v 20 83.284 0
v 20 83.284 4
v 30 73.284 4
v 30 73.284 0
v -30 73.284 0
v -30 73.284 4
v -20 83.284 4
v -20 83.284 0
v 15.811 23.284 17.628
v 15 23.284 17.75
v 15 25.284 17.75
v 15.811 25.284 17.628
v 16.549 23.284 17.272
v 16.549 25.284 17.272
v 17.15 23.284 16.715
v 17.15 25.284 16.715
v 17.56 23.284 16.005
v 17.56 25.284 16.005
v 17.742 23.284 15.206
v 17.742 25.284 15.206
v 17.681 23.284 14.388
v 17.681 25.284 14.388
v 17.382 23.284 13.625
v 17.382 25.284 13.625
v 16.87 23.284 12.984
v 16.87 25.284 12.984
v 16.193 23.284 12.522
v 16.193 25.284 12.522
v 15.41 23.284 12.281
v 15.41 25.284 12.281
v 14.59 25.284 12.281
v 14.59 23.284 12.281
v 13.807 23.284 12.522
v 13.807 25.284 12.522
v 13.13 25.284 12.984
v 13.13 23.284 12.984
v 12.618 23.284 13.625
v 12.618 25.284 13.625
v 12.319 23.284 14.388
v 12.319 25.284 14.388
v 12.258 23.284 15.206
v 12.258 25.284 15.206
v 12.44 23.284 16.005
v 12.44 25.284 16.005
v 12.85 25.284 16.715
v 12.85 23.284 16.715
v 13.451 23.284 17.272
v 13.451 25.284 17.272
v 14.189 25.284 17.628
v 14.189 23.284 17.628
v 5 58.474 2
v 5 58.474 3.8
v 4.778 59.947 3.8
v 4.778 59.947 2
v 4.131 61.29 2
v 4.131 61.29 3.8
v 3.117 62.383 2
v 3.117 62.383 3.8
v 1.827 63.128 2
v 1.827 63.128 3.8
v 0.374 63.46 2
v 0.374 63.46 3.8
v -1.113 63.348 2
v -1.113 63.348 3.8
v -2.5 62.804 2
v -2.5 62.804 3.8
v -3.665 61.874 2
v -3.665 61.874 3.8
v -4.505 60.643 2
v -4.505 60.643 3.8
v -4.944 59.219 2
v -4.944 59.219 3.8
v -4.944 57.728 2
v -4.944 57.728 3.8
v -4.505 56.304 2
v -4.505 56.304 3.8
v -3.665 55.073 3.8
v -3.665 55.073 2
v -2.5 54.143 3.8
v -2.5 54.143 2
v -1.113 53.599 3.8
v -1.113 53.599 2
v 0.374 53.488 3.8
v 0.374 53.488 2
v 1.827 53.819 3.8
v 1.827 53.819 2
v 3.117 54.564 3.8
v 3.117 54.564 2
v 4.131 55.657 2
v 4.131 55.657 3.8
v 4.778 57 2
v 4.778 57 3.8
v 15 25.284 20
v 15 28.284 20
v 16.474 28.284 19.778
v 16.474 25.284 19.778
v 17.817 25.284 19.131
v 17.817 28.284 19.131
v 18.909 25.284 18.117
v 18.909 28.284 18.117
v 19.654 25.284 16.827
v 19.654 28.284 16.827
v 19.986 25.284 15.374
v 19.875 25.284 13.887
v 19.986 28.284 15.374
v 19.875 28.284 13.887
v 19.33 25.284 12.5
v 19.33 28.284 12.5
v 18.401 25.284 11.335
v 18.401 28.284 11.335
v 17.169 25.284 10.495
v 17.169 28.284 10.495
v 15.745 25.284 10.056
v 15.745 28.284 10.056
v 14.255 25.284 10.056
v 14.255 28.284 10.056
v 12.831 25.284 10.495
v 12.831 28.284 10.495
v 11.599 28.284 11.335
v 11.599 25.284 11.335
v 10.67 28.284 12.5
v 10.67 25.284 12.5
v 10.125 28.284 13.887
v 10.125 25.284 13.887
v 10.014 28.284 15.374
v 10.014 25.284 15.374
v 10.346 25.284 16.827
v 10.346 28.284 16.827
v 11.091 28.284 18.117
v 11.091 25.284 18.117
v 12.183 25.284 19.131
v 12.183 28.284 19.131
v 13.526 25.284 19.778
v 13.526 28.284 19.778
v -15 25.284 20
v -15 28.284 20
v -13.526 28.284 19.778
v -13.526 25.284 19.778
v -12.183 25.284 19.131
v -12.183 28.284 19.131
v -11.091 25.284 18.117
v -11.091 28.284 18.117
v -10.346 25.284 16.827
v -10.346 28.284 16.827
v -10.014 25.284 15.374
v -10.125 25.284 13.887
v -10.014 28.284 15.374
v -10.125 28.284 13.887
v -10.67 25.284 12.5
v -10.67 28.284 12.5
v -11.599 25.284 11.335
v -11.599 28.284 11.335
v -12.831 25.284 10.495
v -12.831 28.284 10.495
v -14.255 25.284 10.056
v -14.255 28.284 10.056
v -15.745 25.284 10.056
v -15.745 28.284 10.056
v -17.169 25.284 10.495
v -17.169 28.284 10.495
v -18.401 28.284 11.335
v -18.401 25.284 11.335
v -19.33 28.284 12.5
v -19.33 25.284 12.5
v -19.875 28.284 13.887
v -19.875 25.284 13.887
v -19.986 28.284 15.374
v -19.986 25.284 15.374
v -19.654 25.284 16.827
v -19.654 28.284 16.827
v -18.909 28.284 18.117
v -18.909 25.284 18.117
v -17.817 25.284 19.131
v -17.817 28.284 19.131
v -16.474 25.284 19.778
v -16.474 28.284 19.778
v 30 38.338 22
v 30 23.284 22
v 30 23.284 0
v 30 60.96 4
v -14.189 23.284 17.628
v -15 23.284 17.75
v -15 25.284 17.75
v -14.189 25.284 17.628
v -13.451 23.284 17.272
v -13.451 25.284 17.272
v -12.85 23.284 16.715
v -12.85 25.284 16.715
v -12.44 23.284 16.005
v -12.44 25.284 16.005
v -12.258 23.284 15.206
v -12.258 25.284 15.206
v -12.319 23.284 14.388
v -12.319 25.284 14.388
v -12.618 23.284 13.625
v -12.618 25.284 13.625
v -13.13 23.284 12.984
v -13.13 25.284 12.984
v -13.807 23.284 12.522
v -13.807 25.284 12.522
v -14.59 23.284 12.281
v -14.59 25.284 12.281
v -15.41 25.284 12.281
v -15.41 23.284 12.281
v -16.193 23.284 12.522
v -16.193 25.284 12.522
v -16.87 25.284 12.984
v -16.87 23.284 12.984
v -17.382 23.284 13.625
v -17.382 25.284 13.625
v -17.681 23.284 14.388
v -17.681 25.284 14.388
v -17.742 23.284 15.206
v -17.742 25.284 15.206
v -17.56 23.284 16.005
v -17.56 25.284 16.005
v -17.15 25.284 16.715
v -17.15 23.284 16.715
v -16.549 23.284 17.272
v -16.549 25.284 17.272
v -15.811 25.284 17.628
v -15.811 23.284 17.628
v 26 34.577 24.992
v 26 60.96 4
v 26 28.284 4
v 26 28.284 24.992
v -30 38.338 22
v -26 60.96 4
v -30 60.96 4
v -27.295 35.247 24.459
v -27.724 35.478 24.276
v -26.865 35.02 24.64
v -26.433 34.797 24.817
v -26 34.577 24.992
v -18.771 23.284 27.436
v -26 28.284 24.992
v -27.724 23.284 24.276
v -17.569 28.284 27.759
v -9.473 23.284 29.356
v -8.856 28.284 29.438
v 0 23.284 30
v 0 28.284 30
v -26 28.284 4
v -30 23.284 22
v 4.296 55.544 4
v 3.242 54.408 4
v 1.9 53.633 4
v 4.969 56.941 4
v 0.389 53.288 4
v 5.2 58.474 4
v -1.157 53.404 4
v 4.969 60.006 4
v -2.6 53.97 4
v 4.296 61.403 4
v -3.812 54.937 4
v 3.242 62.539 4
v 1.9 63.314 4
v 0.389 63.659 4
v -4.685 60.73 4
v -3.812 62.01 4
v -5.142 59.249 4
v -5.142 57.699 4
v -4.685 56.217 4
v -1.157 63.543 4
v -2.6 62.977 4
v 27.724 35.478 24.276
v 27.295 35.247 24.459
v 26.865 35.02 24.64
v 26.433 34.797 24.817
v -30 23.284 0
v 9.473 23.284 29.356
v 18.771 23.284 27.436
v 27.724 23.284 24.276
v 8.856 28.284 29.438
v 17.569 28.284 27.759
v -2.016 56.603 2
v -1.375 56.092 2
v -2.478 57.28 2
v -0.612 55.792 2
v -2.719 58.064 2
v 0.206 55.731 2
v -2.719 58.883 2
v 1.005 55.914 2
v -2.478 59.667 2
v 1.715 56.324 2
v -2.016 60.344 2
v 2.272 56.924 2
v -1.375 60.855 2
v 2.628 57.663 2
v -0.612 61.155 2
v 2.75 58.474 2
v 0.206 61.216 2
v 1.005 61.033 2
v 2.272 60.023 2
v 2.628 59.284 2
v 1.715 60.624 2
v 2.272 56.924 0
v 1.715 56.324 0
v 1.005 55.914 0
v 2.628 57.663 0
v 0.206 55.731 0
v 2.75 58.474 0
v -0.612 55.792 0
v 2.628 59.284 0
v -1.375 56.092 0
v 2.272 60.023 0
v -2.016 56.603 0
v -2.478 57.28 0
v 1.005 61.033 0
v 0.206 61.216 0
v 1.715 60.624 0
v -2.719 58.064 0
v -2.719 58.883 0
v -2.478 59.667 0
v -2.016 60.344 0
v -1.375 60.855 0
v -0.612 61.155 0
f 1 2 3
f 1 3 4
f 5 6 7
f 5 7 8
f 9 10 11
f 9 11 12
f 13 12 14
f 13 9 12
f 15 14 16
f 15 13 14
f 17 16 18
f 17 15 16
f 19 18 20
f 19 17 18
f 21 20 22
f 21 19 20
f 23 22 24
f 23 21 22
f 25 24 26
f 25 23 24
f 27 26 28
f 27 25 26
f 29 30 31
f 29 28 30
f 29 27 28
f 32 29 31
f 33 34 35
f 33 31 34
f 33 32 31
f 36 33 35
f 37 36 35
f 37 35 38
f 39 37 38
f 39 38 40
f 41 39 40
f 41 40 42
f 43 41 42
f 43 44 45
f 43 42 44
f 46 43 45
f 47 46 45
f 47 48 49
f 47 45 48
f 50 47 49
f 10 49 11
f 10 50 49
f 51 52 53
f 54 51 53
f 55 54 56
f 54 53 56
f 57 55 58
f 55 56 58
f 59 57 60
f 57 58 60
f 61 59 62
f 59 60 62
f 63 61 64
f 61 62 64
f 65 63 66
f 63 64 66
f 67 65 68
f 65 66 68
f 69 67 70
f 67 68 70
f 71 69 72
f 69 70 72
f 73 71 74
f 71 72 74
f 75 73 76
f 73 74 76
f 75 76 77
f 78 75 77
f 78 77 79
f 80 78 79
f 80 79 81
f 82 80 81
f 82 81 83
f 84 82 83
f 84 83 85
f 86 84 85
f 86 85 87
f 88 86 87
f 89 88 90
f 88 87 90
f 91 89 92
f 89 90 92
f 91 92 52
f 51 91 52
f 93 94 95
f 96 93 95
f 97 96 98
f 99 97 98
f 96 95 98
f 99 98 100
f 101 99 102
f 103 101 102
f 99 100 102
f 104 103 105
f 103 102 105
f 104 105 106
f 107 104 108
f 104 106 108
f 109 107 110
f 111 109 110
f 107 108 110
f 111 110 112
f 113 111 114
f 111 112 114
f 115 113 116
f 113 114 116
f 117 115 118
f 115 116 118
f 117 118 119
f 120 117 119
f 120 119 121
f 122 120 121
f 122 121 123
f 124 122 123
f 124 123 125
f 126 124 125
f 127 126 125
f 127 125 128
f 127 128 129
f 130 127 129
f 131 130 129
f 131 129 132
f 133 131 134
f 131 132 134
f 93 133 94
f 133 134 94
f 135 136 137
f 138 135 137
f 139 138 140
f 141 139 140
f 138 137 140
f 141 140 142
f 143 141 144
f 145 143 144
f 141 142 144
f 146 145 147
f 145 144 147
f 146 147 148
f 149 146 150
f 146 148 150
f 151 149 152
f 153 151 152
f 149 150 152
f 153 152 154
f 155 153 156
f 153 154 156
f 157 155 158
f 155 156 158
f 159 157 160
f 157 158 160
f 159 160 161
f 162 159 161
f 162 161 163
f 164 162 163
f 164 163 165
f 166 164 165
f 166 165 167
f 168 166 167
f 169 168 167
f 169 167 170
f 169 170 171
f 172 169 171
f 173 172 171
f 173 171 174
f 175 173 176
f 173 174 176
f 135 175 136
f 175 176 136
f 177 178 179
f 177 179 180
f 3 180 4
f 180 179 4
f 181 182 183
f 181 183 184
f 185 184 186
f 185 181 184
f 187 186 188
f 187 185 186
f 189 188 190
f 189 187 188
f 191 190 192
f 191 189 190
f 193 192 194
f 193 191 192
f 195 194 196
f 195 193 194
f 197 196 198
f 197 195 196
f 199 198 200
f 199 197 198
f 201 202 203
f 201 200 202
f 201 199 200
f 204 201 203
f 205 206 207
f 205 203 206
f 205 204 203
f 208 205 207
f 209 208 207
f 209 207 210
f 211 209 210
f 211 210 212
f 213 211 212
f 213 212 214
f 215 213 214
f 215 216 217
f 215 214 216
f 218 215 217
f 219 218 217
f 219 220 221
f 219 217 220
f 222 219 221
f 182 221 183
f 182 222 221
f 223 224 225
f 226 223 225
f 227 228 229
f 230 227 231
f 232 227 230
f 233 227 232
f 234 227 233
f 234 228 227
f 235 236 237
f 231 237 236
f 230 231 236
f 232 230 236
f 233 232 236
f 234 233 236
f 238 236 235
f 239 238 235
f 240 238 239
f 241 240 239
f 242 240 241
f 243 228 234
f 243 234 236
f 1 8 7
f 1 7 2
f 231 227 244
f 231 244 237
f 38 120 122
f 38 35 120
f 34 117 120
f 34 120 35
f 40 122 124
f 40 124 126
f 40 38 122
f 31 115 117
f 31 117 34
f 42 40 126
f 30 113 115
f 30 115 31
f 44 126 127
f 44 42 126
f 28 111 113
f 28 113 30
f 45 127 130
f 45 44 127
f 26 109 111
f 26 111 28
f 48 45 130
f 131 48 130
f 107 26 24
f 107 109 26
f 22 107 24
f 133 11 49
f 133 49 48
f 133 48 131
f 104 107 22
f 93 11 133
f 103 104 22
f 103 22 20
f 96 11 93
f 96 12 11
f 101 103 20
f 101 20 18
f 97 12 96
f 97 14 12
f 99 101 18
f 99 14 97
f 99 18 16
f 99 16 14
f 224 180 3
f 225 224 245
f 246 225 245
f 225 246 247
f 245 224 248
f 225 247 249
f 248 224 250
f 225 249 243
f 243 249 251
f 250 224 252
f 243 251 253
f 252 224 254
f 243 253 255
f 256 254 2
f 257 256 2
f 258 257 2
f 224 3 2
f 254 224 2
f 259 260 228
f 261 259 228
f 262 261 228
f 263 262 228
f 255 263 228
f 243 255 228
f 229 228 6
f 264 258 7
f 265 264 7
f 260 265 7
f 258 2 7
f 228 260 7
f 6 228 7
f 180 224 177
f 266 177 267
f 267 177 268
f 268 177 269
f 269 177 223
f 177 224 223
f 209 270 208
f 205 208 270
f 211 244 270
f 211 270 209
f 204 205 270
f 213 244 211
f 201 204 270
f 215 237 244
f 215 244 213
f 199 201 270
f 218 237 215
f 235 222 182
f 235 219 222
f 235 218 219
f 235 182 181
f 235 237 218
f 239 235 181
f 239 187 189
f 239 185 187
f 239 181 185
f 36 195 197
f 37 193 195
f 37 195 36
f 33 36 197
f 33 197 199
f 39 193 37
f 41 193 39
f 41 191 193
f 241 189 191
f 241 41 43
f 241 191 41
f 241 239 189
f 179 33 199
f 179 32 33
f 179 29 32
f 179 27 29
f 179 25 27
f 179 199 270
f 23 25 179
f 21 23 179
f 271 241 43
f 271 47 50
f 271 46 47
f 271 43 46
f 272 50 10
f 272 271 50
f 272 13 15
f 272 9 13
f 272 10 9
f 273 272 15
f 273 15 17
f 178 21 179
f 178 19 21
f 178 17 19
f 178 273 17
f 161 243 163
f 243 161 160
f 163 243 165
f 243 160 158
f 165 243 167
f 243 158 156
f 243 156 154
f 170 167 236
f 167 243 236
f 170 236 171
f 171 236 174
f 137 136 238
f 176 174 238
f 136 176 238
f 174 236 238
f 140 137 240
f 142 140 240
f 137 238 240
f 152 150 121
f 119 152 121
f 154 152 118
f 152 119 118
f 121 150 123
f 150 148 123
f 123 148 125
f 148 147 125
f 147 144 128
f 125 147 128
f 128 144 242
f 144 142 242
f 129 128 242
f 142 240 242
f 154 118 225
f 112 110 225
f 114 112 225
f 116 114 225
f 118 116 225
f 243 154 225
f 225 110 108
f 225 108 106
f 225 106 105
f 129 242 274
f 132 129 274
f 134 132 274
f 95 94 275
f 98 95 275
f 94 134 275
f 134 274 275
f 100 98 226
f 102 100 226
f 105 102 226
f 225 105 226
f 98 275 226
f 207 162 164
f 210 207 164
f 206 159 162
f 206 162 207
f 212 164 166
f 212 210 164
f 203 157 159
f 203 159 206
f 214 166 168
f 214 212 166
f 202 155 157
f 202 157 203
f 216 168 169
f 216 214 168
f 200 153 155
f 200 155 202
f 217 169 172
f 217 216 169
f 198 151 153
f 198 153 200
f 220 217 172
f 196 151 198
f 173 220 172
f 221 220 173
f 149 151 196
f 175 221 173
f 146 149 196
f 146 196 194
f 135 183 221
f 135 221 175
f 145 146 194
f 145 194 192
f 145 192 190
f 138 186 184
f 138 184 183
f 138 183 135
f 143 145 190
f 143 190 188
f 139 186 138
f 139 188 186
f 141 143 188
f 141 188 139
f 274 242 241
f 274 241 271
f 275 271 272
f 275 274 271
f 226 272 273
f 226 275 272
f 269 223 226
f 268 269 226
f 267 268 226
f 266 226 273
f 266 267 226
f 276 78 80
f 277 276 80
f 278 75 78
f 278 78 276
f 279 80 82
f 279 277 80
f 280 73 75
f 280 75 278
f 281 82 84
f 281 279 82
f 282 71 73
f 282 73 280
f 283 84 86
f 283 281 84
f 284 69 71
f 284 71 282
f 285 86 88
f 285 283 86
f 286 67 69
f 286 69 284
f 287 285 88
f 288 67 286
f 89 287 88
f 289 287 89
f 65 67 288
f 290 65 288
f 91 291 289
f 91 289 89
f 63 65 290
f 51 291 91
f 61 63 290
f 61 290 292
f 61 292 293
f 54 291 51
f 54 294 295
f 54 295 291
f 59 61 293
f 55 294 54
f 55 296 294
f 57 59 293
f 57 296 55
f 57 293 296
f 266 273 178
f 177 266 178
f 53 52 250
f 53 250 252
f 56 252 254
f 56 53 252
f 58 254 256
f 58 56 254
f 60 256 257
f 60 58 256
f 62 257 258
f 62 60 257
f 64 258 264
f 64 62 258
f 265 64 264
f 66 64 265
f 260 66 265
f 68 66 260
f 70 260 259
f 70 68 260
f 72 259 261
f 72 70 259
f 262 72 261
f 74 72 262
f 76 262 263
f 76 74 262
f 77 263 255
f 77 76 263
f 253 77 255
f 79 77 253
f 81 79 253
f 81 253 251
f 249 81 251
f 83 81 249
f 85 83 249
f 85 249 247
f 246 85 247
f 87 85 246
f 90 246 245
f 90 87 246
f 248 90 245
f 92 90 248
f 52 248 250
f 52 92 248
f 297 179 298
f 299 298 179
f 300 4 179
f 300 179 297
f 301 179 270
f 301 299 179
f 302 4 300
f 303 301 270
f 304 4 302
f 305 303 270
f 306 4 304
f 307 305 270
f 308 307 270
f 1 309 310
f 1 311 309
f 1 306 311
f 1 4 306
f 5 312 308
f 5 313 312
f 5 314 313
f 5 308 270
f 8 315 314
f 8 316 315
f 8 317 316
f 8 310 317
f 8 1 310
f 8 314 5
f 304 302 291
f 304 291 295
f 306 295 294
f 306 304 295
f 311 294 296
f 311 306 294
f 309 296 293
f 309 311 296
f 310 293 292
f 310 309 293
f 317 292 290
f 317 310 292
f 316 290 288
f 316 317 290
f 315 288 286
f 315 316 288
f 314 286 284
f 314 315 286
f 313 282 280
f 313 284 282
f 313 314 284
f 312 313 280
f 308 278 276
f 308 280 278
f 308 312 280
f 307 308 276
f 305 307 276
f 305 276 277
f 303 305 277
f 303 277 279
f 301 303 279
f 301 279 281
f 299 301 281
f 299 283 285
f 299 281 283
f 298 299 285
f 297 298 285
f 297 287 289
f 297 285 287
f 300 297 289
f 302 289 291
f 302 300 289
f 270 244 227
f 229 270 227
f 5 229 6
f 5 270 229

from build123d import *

# Parameters (mm, degrees)
SKETCH1_W                = 120
SKETCH1_H                = 30
BOSS_EXTRUDE1_DEPTH      = 100
CUT_EXTRUDE1_DEPTH       = 121.415945788
CUT_EXTRUDE1_DEPTH_BACK  = 121.415945788
SKETCH2_R                = 2.15
SKETCH2_W                = 20.1
SKETCH2_H                = 40.4
SKETCH3_OUTSIDE_W        = 153.812
SKETCH3_OUTSIDE_H        = 133.812
CUT_EXTRUDE2_DEPTH       = 121.415945788
CUT_EXTRUDE3_START       = -30
CUT_EXTRUDE3_DEPTH       = 30
SKETCH5_W                = 67.698745078
SKETCH5_H                = 100.8
CUT_EXTRUDE4_DEPTH       = 26
RIB1_REACH               = 122.416
SKETCH6_WALL_W           = 284.590065176
SKETCH6_WALL_H           = 4
RIB6_REACH               = 122.416
SKETCH7_WALL_W           = 284.590065176
SKETCH7_WALL_H           = 4
BOSS_EXTRUDE2_DEPTH      = 5
BOSS_EXTRUDE2_DEPTH_BACK = 4
SKETCH8_R                = 2.15
CUT_EXTRUDE5_DEPTH       = 84.326168543
CUT_EXTRUDE5_DEPTH_BACK  = 84.326168543
SKETCH9_R                = 2.75
SKETCH10_R               = 5
CUT_EXTRUDE6_DEPTH       = 3
CHAMFER1_SIZE            = 8
CUT_EXTRUDE7_START       = -12.194246874
CUT_EXTRUDE7_DEPTH       = 12.194246874
SKETCH12_W               = 37.282730079
SKETCH12_H               = 58.292887361
CUT_EXTRUDE8_DEPTH       = 108.591821251
SKETCH13_W               = 20.1
SKETCH13_H               = 40.4
BOSS_EXTRUDE3_DEPTH      = 4
SKETCH16_W               = 60
SKETCH16_H               = 40
BOSS_EXTRUDE4_DEPTH      = 4
CUT_EXTRUDE9_DEPTH       = 109.484577329
CUT_EXTRUDE9_DEPTH_BACK  = 109.484577329
SKETCH14_R               = 2.75
SKETCH15_R               = 5
CUT_EXTRUDE10_DEPTH      = 2
CHAMFER2_SIZE            = 0.2
CHAMFER3_SIZE            = 10
CUT_EXTRUDE11_DEPTH      = 109.484577329
CUT_EXTRUDE11_DEPTH_BACK = 109.484577329
CHAMFER4_SIZE            = 10


# Read off the part's stored shape, not the designer's step: Cut-Extrude3, Cut-Extrude7
with BuildPart() as part:
    # Sketch1 → Boss-Extrude1 (new body)
    with BuildSketch(Plane(origin=(0, 0, 0), x_dir=(1, 0, 0), z_dir=(0, 1, 0))):
        with Locations((0, -15)):
            Rectangle(SKETCH1_W, SKETCH1_H)
    extrude(amount=BOSS_EXTRUDE1_DEPTH)

    # Sketch2 → Cut-Extrude1 (cut, two sides: drawn at the far end of the back side and taken through both)
    with BuildSketch(Plane.XY.offset(30).offset(-CUT_EXTRUDE1_DEPTH_BACK)):
        with Locations((-4.95, 82.583541889)):
            Circle(SKETCH2_R)
        with Locations((4.95, 82.583541889)):
            Circle(SKETCH2_R)
        with Locations((-4.95, 34.383541889)):
            Circle(SKETCH2_R)
        with Locations((4.95, 34.383541889)):
            Circle(SKETCH2_R)
        with Locations((0, 58.483541889)):
            Rectangle(SKETCH2_W, SKETCH2_H)
    extrude(amount=CUT_EXTRUDE1_DEPTH + CUT_EXTRUDE1_DEPTH_BACK, mode=Mode.SUBTRACT)

    # Sketch3 outside → Cut-Extrude2 (cut, through all)
    with BuildSketch(Plane.XY.offset(30)):
        with Locations((0, 50)):
            Rectangle(SKETCH3_OUTSIDE_W, SKETCH3_OUTSIDE_H)
        with BuildLine():
            Line((-45, 23.283541889), (45, 23.283541889))
            Line((45, 23.283541889), (19.804596008, 86.568297014))
            ThreePointArc((19.804596008, 86.568297014), (0, 100), (-19.804596008, 86.568297014))
            Line((-19.804596008, 86.568297014), (-45, 23.283541889))
        make_face(mode=Mode.SUBTRACT)
    extrude(amount=-CUT_EXTRUDE2_DEPTH, mode=Mode.SUBTRACT)

    # Cut-Extrude3 outline → Cut-Extrude3 (cut)
    with BuildSketch(Plane.XY.offset(30).offset(CUT_EXTRUDE3_START)):
        Polygon((30, 60.95991045), (30, 23.283541889), (45, 23.283541889), align=None)
        Polygon((-30, 23.283541889), (-30, 60.95991045), (-45, 23.283541889), align=None)
    extrude(amount=CUT_EXTRUDE3_DEPTH, mode=Mode.SUBTRACT)

    # Sketch5 → Cut-Extrude4 (cut)
    with BuildSketch(Plane.XY.offset(30)):
        with Locations((0, 78.683541889)):
            Rectangle(SKETCH5_W, SKETCH5_H)
    extrude(amount=-CUT_EXTRUDE4_DEPTH, mode=Mode.SUBTRACT)

    # Sketch6 wall → Rib1 (add, up to next)
    with BuildSketch(Plane(origin=(-30, 44.62172617, 17), x_dir=(0, -0.782514313837, 0.622632595228), z_dir=(0, 0.622632595228, 0.782514313837)), mode=Mode.PRIVATE) as rib1_sk1:
        with Locations((0, 2)):
            Rectangle(SKETCH6_WALL_W, SKETCH6_WALL_H)
    rib1_tool1 = extrude(rib1_sk1.sketch, amount=-RIB1_REACH, mode=Mode.PRIVATE) - part.part
    add(rib1_tool1.solids().sort_by_distance((-30, 44.62172617, 17))[0])

    # Sketch7 wall → Rib6 (add, up to next)
    with BuildSketch(Plane(origin=(30, 44.62172617, 17), x_dir=(0, -0.782514313837, 0.622632595228), z_dir=(0, -0.622632595228, -0.782514313837)), mode=Mode.PRIVATE) as rib6_sk1:
        with Locations((0, 2)):
            Rectangle(SKETCH7_WALL_W, SKETCH7_WALL_H)
    rib6_tool1 = extrude(rib6_sk1.sketch, amount=RIB6_REACH, mode=Mode.PRIVATE) - part.part
    add(rib6_tool1.solids().sort_by_distance((30, 44.62172617, 17))[0])

    # Sketch8 → Boss-Extrude2 (add, two sides: drawn at the far end of the back side and taken through both)
    with BuildSketch(Plane.XY.offset(4).offset(-BOSS_EXTRUDE2_DEPTH_BACK)):
        with Locations((-4.95, 82.583541889)):
            Circle(SKETCH8_R)
        with Locations((4.95, 82.583541889)):
            Circle(SKETCH8_R)
        with Locations((-4.95, 34.383541889)):
            Circle(SKETCH8_R)
        with Locations((4.95, 34.383541889)):
            Circle(SKETCH8_R)
    extrude(amount=BOSS_EXTRUDE2_DEPTH + BOSS_EXTRUDE2_DEPTH_BACK)

    # Sketch9 → Cut-Extrude5 (cut, two sides: drawn at the far end of the back side and taken through both)
    with BuildSketch(Plane(origin=(0, 28.283541889, 0), x_dir=(1, 0, 0), z_dir=(0, 1, 0)).offset(-CUT_EXTRUDE5_DEPTH_BACK)):
        with Locations(Location((-15, -15, 0), (0, 0, 270))):
            Circle(SKETCH9_R)
        with Locations(Location((15, -15, 0), (0, 0, 270))):
            Circle(SKETCH9_R)
    extrude(amount=CUT_EXTRUDE5_DEPTH + CUT_EXTRUDE5_DEPTH_BACK, mode=Mode.SUBTRACT)

    # Sketch10 → Cut-Extrude6 (cut)
    with BuildSketch(Plane(origin=(0, 28.283541889, 0), x_dir=(1, 0, 0), z_dir=(0, 1, 0))):
        with Locations(Location((-15, -15, 0), (0, 0, 270))):
            Circle(SKETCH10_R)
        with Locations(Location((15, -15, 0), (0, 0, 270))):
            Circle(SKETCH10_R)
    extrude(amount=-CUT_EXTRUDE6_DEPTH, mode=Mode.SUBTRACT)

    # Chamfer1
    # the kernel refuses this chamfer: 8 mm, written as the material it takes off along each edge
    with BuildSketch(Plane(origin=(-30, 2.710077985, 30), x_dir=(-0.02749587661058658, 0, -0.9996219169112968), z_dir=(0, 1, 0))) as chamfer1_piece_1:
        Polygon((CHAMFER1_SIZE * 0.999621916911, -CHAMFER1_SIZE * 0.0274958766106), (-CHAMFER1_SIZE * 0.0274958766106, -CHAMFER1_SIZE * 0.999621916911), (0, 0), align=None)
    extrude(amount=46.146927807, mode=Mode.SUBTRACT)
    with BuildSketch(Plane(origin=(30, 48.857005793, 30), x_dir=(-0.9996219169112968, 0, 0.027495876610586487), z_dir=(0, -1, 0))) as chamfer1_piece_2:
        Polygon((CHAMFER1_SIZE * 0.999621916911, CHAMFER1_SIZE * 0.0274958766106), (-CHAMFER1_SIZE * 0.0274958766106, CHAMFER1_SIZE * 0.999621916911), (0, 0), align=None)
    extrude(amount=46.146927807, mode=Mode.SUBTRACT)

    # Cut-Extrude7 outline → Cut-Extrude7 (cut)
    with BuildSketch(Plane.XZ.offset(-23.283541889).offset(CUT_EXTRUDE7_START)):
        with BuildLine():
            ThreePointArc((-27.724333118, 24.275666882), (-14.154563191, 28.553981218), (0, 30))
            Line((0, 30), (-22, 30))
            Line((-22, 30), (-27.724333118, 24.275666882))
        make_face()
        with BuildLine():
            ThreePointArc((0, 30), (14.154563191, 28.553981218), (27.724333118, 24.275666882))
            Line((27.724333118, 24.275666882), (22, 30))
            Line((22, 30), (0, 30))
        make_face()
    extrude(amount=CUT_EXTRUDE7_DEPTH, mode=Mode.SUBTRACT)

    # Sketch12 → Cut-Extrude8 (cut, through all)
    with BuildSketch(Plane.XY.offset(4)):
        with Locations((-0.669441285, 59.375969669)):
            Rectangle(SKETCH12_W, SKETCH12_H)
    extrude(amount=CUT_EXTRUDE8_DEPTH, mode=Mode.SUBTRACT)

    # Sketch13 → Boss-Extrude3 (add)
    with BuildSketch(Plane.XY.offset(4)):
        with Locations((0, 58.483541889)):
            Rectangle(SKETCH13_W, SKETCH13_H)
    extrude(amount=-BOSS_EXTRUDE3_DEPTH)

    # Sketch16 → Boss-Extrude4 (add)
    with BuildSketch(Plane(origin=(0, 0, 0), x_dir=(-1, 0, 0), z_dir=(0, 0, -1))):
        with Locations((0, 80.95991045)):
            Rectangle(SKETCH16_W, SKETCH16_H)
    extrude(amount=-BOSS_EXTRUDE4_DEPTH)

    # Sketch14 → Cut-Extrude9 (cut, two sides: drawn at the far end of the back side and taken through both)
    with BuildSketch(Plane.XY.offset(4).offset(-CUT_EXTRUDE9_DEPTH_BACK)):
        with Locations((0, 58.473541889)):
            Circle(SKETCH14_R)
    extrude(amount=CUT_EXTRUDE9_DEPTH + CUT_EXTRUDE9_DEPTH_BACK, mode=Mode.SUBTRACT)

    # Sketch15 → Cut-Extrude10 (cut)
    with BuildSketch(Plane.XY.offset(4)):
        with Locations((0, 58.473541889)):
            Circle(SKETCH15_R)
    extrude(amount=-CUT_EXTRUDE10_DEPTH, mode=Mode.SUBTRACT)

    # Chamfer2
    chamfer2_edges = [part.edges().sort_by_distance(p)[0] for p in [
        (-5, 58.473541889, 4),
    ]]
    chamfer(chamfer2_edges, length=CHAMFER2_SIZE)

    # Chamfer3
    chamfer3_edges = [part.edges().sort_by_distance(p)[0] for p in [
        (30, 100.95991045, 2),
        (-30, 100.95991045, 2),
    ]]
    chamfer(chamfer3_edges, length=CHAMFER3_SIZE)

    # Sketch17 → Cut-Extrude11 (cut, two sides: drawn at the far end of the back side and taken through both)
    with BuildSketch(Plane.XY.offset(4).offset(-CUT_EXTRUDE11_DEPTH_BACK)):
        Polygon((-49.480687217, 83.283541889), (47.707933407, 83.283541889), (47.707933407, 123.775741613), (-59.194126739, 121.253008662), align=None)
    extrude(amount=CUT_EXTRUDE11_DEPTH + CUT_EXTRUDE11_DEPTH_BACK, mode=Mode.SUBTRACT)

    # Chamfer4
    chamfer4_edges = [part.edges().sort_by_distance(p)[0] for p in [
        (-30, 83.283541889, 2),
        (30, 83.283541889, 2),
    ]]
    chamfer(chamfer4_edges, length=CHAMFER4_SIZE)


solid = part.part
